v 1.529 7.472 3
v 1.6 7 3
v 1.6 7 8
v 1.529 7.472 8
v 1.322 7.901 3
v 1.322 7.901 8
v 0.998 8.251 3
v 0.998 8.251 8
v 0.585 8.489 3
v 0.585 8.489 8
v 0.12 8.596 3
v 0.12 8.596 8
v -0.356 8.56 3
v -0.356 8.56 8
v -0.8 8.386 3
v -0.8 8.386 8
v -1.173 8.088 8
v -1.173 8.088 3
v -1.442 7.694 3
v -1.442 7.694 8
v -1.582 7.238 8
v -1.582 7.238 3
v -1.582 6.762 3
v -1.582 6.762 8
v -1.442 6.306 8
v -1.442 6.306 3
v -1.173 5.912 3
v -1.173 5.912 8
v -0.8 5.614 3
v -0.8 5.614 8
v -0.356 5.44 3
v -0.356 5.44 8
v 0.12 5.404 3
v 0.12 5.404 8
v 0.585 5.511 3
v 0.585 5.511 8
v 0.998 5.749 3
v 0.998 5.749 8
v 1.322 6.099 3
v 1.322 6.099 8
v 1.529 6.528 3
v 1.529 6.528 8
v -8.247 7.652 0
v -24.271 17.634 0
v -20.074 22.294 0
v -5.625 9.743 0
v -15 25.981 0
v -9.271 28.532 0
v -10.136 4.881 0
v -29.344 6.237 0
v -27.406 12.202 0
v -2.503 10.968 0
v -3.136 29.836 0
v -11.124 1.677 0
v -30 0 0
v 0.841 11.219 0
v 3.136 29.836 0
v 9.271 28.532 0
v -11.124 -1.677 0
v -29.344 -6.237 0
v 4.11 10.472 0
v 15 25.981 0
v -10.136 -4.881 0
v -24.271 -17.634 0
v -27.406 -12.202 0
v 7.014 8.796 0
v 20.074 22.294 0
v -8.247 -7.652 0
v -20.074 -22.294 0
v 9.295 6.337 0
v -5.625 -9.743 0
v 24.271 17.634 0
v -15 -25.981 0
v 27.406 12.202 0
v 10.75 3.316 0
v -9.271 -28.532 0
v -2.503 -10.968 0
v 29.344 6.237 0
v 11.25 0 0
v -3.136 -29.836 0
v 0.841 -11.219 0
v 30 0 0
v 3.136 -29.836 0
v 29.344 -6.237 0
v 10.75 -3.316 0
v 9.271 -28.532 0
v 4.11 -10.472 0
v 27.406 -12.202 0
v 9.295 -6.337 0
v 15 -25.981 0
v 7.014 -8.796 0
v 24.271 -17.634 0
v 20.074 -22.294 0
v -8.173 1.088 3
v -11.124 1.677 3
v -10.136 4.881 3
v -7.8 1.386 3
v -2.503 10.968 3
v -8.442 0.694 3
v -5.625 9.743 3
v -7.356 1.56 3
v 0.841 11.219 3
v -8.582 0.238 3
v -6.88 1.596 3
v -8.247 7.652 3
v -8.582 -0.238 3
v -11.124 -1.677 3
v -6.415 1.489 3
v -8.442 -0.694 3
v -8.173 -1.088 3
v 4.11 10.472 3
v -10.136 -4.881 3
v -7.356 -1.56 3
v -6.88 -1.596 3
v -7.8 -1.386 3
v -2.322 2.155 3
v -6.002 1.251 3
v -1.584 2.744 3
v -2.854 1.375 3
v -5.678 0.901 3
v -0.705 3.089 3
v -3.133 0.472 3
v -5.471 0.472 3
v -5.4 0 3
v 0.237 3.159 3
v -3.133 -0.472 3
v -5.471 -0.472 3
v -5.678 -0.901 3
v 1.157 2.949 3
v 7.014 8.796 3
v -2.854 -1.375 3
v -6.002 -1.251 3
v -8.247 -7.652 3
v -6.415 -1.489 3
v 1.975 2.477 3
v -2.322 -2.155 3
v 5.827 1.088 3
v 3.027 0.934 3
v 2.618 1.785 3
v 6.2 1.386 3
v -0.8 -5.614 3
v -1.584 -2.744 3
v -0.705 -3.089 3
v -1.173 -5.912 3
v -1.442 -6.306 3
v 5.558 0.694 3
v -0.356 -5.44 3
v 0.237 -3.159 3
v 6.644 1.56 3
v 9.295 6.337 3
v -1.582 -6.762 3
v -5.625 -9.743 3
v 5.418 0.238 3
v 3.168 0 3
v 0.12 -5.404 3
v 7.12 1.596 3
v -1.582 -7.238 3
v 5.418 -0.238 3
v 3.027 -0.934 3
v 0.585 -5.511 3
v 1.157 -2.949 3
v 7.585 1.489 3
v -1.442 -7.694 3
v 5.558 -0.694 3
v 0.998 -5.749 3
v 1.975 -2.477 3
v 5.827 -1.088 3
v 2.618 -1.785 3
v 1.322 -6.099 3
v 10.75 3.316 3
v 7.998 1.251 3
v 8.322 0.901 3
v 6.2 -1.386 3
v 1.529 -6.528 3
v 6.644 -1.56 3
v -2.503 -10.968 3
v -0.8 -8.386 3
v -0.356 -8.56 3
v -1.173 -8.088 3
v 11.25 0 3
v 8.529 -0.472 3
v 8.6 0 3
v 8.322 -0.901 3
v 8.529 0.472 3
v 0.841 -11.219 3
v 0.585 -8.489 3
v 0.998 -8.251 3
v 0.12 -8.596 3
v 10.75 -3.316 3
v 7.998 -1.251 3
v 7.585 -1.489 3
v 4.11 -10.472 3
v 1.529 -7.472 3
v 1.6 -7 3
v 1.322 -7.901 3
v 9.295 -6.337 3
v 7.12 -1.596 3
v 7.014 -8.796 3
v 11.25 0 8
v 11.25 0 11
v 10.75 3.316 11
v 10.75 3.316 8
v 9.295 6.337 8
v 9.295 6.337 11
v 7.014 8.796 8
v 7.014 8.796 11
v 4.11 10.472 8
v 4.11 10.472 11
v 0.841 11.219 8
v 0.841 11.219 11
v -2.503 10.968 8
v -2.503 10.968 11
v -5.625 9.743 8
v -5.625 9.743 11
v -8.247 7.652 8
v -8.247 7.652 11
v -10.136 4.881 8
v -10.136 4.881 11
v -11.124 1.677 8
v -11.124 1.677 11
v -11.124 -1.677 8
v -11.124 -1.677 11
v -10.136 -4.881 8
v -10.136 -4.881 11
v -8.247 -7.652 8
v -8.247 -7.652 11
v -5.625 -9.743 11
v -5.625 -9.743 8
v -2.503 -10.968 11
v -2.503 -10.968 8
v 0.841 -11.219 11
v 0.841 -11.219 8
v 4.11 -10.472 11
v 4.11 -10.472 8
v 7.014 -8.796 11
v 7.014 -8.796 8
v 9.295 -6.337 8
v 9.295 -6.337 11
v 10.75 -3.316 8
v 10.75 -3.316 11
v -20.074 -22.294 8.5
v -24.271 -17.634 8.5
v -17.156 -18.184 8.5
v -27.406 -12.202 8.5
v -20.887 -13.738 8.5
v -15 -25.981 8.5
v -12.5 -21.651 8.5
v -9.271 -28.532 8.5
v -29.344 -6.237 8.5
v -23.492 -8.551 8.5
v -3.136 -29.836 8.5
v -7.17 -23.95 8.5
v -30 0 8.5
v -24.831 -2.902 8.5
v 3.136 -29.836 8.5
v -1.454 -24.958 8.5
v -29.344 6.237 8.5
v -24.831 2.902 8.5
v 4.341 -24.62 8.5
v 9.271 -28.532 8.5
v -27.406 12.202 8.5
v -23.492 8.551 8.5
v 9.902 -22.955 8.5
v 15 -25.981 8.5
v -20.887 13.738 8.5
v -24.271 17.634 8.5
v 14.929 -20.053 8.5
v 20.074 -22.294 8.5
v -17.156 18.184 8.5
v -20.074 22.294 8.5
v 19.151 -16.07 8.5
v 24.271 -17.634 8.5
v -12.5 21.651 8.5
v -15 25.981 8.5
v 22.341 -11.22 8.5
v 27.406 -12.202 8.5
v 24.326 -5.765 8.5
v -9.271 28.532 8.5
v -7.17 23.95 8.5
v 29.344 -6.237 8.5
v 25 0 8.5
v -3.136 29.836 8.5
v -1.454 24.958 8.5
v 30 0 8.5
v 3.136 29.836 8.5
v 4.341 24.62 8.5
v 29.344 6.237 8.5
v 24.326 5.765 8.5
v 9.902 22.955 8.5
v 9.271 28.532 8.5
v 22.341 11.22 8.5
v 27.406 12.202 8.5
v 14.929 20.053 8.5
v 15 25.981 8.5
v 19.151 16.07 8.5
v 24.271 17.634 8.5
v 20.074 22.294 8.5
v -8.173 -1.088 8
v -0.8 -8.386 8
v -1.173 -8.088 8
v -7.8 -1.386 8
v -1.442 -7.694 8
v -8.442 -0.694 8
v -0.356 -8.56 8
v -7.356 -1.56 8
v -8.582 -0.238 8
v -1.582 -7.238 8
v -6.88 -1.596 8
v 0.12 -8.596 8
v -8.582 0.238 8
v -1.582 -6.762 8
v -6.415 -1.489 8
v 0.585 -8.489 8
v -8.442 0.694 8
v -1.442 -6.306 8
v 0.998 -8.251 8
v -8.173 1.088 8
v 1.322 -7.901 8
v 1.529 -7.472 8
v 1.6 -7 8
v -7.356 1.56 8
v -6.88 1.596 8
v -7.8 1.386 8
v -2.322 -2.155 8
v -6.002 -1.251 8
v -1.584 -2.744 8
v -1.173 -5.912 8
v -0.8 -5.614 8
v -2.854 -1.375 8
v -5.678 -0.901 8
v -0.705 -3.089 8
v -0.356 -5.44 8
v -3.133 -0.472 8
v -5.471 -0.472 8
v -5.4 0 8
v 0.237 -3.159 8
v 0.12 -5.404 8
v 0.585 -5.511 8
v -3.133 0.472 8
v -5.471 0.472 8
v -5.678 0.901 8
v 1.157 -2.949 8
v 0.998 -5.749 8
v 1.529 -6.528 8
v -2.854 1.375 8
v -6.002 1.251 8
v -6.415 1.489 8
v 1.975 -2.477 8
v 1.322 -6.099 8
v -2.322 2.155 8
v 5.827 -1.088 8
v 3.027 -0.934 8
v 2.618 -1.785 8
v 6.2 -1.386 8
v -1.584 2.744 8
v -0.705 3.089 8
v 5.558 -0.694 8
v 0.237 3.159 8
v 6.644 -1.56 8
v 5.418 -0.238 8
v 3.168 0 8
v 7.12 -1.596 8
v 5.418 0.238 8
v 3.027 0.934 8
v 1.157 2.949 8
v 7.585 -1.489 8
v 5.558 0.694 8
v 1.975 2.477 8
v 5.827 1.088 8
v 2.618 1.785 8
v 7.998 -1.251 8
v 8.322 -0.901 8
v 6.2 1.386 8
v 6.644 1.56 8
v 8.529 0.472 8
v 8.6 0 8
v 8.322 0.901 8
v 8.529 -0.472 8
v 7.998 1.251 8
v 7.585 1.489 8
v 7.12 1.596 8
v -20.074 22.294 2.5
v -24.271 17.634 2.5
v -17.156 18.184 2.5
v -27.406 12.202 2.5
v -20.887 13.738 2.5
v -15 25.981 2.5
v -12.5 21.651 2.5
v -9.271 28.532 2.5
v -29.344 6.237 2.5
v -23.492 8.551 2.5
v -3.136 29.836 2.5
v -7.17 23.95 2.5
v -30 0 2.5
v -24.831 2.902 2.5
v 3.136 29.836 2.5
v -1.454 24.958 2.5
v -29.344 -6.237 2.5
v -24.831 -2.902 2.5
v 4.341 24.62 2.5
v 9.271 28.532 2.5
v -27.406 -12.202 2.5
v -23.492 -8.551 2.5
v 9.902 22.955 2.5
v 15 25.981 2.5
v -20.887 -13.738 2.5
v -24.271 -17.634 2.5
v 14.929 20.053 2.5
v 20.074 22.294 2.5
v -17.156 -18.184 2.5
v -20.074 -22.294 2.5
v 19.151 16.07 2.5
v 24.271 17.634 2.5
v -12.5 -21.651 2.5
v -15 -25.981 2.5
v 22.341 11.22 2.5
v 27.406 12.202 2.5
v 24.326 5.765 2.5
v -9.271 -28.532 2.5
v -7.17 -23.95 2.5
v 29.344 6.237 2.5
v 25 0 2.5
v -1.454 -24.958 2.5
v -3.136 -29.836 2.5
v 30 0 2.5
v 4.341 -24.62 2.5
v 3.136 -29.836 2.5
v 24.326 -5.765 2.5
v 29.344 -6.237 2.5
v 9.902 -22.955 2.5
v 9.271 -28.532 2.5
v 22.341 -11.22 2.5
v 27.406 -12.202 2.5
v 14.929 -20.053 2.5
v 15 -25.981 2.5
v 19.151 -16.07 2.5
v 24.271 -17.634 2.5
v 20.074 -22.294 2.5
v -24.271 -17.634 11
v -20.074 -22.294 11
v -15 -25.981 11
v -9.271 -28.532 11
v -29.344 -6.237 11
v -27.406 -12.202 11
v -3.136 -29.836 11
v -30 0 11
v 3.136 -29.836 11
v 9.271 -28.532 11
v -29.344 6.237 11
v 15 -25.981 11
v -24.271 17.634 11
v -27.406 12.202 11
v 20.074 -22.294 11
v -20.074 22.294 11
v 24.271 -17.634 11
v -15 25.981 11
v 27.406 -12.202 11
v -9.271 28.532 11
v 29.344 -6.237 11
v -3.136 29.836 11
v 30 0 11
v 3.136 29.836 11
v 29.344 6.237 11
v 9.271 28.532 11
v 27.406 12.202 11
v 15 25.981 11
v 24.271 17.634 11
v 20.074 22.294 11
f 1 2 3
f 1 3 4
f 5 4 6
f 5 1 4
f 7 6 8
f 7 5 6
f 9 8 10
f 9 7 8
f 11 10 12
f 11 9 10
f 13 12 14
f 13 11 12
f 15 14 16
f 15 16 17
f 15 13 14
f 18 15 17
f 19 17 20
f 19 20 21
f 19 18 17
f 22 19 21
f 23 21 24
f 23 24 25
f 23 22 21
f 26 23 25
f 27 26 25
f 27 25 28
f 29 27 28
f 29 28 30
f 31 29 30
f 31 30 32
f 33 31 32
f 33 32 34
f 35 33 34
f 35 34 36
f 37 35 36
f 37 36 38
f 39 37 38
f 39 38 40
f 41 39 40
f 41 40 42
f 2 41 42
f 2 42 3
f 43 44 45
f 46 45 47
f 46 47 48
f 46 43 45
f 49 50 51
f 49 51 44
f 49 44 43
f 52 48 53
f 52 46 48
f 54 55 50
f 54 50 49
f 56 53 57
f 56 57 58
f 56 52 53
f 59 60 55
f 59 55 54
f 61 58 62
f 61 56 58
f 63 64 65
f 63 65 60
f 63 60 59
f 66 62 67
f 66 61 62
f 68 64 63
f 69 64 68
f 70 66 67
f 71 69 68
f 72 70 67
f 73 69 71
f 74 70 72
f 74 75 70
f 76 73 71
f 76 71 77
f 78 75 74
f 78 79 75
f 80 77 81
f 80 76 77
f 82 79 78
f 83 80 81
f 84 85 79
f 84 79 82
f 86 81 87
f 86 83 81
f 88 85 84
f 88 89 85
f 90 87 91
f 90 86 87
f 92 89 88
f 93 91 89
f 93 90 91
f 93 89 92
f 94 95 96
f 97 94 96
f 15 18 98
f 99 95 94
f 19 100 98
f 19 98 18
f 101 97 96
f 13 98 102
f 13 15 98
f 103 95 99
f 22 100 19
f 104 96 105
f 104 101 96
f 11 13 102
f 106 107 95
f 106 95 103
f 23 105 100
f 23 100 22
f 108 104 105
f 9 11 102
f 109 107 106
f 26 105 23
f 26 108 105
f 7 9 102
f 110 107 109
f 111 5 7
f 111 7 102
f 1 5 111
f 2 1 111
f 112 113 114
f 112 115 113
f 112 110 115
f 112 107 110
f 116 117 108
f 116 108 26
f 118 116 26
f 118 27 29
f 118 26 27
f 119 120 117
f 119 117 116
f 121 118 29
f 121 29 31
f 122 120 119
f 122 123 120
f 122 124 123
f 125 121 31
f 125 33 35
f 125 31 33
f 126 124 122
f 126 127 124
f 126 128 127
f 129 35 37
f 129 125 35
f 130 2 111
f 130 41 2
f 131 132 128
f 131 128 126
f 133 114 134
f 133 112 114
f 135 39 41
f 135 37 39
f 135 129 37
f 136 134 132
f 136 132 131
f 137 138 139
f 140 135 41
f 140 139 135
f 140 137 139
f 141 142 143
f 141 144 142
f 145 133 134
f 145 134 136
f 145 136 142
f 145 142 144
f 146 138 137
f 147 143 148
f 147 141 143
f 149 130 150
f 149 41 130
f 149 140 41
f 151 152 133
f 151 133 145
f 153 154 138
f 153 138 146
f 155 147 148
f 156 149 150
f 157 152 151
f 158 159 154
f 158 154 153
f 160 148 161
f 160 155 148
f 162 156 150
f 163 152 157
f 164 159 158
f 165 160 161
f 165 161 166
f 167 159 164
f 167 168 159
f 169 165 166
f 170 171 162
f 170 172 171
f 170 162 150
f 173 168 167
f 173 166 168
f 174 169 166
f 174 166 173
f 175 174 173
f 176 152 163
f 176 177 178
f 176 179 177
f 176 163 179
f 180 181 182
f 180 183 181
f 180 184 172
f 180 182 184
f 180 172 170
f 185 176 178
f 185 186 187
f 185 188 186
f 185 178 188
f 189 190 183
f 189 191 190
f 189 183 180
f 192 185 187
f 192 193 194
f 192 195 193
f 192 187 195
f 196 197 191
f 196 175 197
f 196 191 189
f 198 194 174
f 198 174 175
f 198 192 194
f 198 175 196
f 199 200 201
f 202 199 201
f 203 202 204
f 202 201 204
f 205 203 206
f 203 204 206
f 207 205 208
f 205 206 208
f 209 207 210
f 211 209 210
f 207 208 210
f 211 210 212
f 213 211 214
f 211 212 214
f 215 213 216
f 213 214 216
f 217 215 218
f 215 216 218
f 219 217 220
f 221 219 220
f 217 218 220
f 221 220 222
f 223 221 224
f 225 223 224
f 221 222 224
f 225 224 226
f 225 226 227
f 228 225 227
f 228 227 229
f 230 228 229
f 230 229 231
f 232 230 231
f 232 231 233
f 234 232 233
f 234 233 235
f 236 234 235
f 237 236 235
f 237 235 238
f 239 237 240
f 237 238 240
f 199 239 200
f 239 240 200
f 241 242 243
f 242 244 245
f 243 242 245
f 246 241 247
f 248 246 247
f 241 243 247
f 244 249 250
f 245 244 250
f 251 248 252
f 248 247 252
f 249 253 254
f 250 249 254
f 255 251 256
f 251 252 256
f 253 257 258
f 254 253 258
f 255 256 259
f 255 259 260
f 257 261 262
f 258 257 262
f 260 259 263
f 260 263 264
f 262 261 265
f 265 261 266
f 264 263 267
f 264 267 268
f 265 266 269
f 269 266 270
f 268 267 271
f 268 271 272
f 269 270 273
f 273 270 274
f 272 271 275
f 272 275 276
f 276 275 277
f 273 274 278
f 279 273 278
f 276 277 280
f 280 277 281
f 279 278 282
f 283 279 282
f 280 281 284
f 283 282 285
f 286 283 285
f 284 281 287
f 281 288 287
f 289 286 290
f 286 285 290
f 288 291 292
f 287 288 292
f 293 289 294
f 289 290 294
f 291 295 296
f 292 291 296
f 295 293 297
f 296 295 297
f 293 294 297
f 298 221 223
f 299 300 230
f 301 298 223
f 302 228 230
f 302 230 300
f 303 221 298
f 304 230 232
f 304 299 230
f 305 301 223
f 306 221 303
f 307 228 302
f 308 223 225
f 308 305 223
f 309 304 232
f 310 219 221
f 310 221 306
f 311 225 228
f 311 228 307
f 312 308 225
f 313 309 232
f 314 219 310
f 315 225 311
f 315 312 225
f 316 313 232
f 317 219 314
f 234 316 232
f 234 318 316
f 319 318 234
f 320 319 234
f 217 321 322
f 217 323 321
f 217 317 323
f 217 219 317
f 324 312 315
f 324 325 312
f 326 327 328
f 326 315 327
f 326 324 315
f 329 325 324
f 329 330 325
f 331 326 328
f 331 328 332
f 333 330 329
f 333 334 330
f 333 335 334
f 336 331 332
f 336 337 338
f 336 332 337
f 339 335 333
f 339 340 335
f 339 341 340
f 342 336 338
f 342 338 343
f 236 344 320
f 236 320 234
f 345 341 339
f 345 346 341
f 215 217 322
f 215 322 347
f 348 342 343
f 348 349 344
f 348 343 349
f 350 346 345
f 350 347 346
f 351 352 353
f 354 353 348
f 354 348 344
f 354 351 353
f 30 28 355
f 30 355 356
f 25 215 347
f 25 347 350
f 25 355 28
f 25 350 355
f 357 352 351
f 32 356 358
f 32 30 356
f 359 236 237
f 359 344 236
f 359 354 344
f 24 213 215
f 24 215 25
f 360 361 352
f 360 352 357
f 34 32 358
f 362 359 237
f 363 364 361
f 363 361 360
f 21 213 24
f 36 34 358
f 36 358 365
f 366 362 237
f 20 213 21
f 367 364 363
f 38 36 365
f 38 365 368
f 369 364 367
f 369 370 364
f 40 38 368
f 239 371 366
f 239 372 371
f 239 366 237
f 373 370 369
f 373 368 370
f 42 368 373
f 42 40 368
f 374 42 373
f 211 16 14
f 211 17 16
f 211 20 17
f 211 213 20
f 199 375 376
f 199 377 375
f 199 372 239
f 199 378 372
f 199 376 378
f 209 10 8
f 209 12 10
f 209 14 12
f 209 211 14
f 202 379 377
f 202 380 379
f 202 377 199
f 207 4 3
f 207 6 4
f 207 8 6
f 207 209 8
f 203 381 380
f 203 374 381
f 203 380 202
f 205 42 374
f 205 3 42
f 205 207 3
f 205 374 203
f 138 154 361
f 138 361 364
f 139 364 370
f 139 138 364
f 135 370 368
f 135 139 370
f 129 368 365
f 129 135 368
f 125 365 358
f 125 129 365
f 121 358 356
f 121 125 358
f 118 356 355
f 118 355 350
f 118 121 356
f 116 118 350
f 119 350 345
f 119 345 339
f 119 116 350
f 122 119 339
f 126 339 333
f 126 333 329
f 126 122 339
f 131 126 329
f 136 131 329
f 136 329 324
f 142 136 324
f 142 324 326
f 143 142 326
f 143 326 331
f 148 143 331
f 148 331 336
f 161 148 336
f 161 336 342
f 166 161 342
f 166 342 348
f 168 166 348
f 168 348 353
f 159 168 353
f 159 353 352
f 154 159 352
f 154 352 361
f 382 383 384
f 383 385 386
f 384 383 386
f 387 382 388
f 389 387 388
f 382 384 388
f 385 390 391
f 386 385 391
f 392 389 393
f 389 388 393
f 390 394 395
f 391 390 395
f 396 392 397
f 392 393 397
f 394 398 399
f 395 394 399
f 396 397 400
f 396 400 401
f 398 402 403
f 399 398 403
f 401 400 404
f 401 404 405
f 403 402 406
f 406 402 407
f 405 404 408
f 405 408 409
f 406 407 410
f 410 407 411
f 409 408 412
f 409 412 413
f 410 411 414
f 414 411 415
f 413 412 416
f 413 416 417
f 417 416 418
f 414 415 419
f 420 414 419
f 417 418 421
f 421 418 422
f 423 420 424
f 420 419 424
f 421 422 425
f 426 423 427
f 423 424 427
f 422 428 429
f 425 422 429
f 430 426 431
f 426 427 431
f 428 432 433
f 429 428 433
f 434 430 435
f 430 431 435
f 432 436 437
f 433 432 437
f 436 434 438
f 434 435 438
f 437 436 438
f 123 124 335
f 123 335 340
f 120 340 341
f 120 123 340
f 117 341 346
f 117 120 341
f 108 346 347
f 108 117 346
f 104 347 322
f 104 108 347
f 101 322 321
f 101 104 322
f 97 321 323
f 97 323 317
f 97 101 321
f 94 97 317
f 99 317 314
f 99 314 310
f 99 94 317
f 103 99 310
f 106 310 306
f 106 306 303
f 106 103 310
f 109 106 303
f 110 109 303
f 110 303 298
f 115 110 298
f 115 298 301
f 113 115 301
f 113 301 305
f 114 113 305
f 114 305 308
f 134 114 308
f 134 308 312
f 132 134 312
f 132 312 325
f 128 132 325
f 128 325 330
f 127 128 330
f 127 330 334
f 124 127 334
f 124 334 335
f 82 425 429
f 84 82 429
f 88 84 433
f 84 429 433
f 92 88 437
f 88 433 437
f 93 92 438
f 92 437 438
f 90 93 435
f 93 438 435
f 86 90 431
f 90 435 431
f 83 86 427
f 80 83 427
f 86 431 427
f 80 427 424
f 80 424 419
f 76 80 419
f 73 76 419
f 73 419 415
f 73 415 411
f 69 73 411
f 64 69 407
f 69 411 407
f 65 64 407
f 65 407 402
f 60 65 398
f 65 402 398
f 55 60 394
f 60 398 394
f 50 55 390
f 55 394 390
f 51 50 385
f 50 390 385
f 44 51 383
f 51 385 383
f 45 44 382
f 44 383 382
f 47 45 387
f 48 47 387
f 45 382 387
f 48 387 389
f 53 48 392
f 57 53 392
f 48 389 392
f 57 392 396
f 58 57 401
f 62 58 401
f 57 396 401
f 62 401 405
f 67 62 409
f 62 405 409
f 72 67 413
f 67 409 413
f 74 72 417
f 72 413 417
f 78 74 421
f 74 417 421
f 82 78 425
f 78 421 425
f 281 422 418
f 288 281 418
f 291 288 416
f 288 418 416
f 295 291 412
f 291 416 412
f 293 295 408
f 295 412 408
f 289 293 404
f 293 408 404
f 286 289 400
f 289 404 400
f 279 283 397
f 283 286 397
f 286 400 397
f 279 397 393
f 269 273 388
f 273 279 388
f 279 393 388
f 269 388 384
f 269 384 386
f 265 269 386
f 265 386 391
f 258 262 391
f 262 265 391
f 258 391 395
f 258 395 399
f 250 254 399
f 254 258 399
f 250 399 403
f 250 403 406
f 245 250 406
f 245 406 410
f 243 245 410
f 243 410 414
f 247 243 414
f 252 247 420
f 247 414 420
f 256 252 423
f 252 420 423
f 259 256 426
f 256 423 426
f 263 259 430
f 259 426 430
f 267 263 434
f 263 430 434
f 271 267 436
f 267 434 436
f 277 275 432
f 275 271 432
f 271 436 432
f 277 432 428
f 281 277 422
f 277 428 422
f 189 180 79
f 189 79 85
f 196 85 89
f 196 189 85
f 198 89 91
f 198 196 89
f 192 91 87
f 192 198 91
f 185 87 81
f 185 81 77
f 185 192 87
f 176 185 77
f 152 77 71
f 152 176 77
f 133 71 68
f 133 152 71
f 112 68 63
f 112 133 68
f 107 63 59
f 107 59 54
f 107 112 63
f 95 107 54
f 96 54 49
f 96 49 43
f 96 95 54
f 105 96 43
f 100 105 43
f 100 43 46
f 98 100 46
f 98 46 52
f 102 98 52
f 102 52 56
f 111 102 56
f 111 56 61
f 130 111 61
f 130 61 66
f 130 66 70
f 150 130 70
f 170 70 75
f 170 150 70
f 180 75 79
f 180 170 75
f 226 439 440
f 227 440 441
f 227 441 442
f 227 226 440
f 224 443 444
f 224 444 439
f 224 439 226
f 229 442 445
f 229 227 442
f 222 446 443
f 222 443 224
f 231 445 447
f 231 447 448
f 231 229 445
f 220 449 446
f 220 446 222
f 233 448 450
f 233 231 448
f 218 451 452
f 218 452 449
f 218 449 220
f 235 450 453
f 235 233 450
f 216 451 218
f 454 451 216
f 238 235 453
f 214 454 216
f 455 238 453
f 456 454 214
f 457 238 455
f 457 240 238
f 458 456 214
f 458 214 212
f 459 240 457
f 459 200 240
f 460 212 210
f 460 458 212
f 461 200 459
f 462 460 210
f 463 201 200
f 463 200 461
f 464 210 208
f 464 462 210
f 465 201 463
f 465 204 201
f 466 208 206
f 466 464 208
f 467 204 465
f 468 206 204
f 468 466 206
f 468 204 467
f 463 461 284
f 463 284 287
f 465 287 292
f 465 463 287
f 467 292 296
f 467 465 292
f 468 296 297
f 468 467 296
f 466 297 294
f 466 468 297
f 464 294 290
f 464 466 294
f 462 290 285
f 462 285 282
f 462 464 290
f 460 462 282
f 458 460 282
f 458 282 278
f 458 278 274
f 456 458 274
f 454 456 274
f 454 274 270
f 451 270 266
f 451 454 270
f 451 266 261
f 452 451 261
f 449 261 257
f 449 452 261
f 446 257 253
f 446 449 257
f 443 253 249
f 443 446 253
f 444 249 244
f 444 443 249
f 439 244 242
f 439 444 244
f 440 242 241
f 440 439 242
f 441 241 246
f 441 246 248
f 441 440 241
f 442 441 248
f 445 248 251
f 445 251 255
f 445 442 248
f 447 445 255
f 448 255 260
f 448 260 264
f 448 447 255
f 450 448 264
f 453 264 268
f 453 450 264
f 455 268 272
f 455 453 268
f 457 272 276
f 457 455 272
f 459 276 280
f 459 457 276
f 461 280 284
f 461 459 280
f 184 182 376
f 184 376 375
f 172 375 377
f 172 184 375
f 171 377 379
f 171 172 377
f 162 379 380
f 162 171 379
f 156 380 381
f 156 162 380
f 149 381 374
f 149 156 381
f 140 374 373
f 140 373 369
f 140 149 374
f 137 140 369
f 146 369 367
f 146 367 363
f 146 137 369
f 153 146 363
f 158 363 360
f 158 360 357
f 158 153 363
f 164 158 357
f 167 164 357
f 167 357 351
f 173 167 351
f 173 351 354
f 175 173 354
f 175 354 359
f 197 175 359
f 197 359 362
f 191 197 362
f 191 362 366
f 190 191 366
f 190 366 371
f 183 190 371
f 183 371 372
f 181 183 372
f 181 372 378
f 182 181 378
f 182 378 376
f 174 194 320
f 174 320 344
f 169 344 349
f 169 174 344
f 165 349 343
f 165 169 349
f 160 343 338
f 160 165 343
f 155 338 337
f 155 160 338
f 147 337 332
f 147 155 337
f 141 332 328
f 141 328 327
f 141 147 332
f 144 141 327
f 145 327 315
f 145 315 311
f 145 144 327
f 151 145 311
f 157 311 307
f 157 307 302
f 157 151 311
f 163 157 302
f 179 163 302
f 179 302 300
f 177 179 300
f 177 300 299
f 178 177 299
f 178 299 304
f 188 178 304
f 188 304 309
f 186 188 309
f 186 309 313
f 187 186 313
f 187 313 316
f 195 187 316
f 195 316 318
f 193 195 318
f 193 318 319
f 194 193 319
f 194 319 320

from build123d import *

# Parameters (mm, degrees)
CUT_EXTRUDE1_START         = -11
CUT_EXTRUDE1_OUTLINE_R     = 25
CUT_EXTRUDE1_OUTLINE_R_2   = 10.5
CUT_EXTRUDE1_DEPTH         = 11
CUT_EXTRUDE1_2_OUTLINE_R   = 10.5
CUT_EXTRUDE1_2_OUTLINE_R_2 = 1.6
CUT_EXTRUDE1_2_OUTLINE_R_3 = 3.16810248
CUT_EXTRUDE1_2_DEPTH       = 8
SKETCH2_R                  = 30
BOSS_EXTRUDE1_DEPTH        = 2.5
BOSS_EXTRUDE2_START        = -2.5
SKETCH3_R                  = 30
BOSS_EXTRUDE2_DEPTH        = 2.5
SKETCH4_R                  = 11.25
CUT_EXTRUDE2_DEPTH         = 3
CUT_EXTRUDE3_START         = -3
SKETCH5_R                  = 3.16810248
CUT_EXTRUDE3_DEPTH         = 3
CUT_EXTRUDE4_START         = -3
SKETCH7_R                  = 11.25
CUT_EXTRUDE4_DEPTH         = 3


with BuildPart() as part:
    # Cut-Extrude1: read off the stored shape, not the designer's step
    # Cut-Extrude1 outline → Cut-Extrude1 (new body)
    with BuildSketch(Plane.XY.offset(11).offset(CUT_EXTRUDE1_START)):
        Circle(CUT_EXTRUDE1_OUTLINE_R)
        Circle(CUT_EXTRUDE1_OUTLINE_R_2, mode=Mode.SUBTRACT)
    extrude(amount=CUT_EXTRUDE1_DEPTH)

    # Cut-Extrude1 2 outline → Cut-Extrude1 2 (add)
    with BuildSketch(Plane.XY.offset(11).offset(CUT_EXTRUDE1_START)):
        Circle(CUT_EXTRUDE1_2_OUTLINE_R)
        with Locations((0, -7)):
            Circle(CUT_EXTRUDE1_2_OUTLINE_R_2, mode=Mode.SUBTRACT)
        with Locations((-7, 0)):
            Circle(CUT_EXTRUDE1_2_OUTLINE_R_2, mode=Mode.SUBTRACT)
        Circle(CUT_EXTRUDE1_2_OUTLINE_R_3, mode=Mode.SUBTRACT)
        with Locations((7, 0)):
            Circle(CUT_EXTRUDE1_2_OUTLINE_R_2, mode=Mode.SUBTRACT)
        with Locations((0, 7)):
            Circle(CUT_EXTRUDE1_2_OUTLINE_R_2, mode=Mode.SUBTRACT)
    extrude(amount=CUT_EXTRUDE1_2_DEPTH)

    # Sketch2 → Boss-Extrude1 (add)
    with BuildSketch(Plane.XY.offset(11)):
        Circle(SKETCH2_R)
    extrude(amount=-BOSS_EXTRUDE1_DEPTH)

    # Sketch3 → Boss-Extrude2 (add)
    with BuildSketch(Plane(origin=(0, 0, 0), x_dir=(-1, 0, 0), z_dir=(0, 0, -1)).offset(BOSS_EXTRUDE2_START)):
        with Locations(Location((0, 0, 0), (0, 0, 180))):
            Circle(SKETCH3_R)
    extrude(amount=BOSS_EXTRUDE2_DEPTH)

    # Sketch4 → Cut-Extrude2 (cut)
    with BuildSketch(Plane.XY.offset(11)):
        Circle(SKETCH4_R)
    extrude(amount=-CUT_EXTRUDE2_DEPTH, mode=Mode.SUBTRACT)

    # Sketch5 → Cut-Extrude3 (cut)
    with BuildSketch(Plane.XY.offset(2.5).offset(CUT_EXTRUDE3_START)):
        Circle(SKETCH5_R)
    extrude(amount=CUT_EXTRUDE3_DEPTH, mode=Mode.SUBTRACT)

    # Sketch7 → Cut-Extrude4 (cut)
    with BuildSketch(Plane(origin=(0, 0, 0), x_dir=(-1, 0, 0), z_dir=(0, 0, -1)).offset(CUT_EXTRUDE4_START)):
        with Locations(Location((0, 0, 0), (0, 0, 180))):
            Circle(SKETCH7_R)
    extrude(amount=CUT_EXTRUDE4_DEPTH, mode=Mode.SUBTRACT)


solid = part.part
